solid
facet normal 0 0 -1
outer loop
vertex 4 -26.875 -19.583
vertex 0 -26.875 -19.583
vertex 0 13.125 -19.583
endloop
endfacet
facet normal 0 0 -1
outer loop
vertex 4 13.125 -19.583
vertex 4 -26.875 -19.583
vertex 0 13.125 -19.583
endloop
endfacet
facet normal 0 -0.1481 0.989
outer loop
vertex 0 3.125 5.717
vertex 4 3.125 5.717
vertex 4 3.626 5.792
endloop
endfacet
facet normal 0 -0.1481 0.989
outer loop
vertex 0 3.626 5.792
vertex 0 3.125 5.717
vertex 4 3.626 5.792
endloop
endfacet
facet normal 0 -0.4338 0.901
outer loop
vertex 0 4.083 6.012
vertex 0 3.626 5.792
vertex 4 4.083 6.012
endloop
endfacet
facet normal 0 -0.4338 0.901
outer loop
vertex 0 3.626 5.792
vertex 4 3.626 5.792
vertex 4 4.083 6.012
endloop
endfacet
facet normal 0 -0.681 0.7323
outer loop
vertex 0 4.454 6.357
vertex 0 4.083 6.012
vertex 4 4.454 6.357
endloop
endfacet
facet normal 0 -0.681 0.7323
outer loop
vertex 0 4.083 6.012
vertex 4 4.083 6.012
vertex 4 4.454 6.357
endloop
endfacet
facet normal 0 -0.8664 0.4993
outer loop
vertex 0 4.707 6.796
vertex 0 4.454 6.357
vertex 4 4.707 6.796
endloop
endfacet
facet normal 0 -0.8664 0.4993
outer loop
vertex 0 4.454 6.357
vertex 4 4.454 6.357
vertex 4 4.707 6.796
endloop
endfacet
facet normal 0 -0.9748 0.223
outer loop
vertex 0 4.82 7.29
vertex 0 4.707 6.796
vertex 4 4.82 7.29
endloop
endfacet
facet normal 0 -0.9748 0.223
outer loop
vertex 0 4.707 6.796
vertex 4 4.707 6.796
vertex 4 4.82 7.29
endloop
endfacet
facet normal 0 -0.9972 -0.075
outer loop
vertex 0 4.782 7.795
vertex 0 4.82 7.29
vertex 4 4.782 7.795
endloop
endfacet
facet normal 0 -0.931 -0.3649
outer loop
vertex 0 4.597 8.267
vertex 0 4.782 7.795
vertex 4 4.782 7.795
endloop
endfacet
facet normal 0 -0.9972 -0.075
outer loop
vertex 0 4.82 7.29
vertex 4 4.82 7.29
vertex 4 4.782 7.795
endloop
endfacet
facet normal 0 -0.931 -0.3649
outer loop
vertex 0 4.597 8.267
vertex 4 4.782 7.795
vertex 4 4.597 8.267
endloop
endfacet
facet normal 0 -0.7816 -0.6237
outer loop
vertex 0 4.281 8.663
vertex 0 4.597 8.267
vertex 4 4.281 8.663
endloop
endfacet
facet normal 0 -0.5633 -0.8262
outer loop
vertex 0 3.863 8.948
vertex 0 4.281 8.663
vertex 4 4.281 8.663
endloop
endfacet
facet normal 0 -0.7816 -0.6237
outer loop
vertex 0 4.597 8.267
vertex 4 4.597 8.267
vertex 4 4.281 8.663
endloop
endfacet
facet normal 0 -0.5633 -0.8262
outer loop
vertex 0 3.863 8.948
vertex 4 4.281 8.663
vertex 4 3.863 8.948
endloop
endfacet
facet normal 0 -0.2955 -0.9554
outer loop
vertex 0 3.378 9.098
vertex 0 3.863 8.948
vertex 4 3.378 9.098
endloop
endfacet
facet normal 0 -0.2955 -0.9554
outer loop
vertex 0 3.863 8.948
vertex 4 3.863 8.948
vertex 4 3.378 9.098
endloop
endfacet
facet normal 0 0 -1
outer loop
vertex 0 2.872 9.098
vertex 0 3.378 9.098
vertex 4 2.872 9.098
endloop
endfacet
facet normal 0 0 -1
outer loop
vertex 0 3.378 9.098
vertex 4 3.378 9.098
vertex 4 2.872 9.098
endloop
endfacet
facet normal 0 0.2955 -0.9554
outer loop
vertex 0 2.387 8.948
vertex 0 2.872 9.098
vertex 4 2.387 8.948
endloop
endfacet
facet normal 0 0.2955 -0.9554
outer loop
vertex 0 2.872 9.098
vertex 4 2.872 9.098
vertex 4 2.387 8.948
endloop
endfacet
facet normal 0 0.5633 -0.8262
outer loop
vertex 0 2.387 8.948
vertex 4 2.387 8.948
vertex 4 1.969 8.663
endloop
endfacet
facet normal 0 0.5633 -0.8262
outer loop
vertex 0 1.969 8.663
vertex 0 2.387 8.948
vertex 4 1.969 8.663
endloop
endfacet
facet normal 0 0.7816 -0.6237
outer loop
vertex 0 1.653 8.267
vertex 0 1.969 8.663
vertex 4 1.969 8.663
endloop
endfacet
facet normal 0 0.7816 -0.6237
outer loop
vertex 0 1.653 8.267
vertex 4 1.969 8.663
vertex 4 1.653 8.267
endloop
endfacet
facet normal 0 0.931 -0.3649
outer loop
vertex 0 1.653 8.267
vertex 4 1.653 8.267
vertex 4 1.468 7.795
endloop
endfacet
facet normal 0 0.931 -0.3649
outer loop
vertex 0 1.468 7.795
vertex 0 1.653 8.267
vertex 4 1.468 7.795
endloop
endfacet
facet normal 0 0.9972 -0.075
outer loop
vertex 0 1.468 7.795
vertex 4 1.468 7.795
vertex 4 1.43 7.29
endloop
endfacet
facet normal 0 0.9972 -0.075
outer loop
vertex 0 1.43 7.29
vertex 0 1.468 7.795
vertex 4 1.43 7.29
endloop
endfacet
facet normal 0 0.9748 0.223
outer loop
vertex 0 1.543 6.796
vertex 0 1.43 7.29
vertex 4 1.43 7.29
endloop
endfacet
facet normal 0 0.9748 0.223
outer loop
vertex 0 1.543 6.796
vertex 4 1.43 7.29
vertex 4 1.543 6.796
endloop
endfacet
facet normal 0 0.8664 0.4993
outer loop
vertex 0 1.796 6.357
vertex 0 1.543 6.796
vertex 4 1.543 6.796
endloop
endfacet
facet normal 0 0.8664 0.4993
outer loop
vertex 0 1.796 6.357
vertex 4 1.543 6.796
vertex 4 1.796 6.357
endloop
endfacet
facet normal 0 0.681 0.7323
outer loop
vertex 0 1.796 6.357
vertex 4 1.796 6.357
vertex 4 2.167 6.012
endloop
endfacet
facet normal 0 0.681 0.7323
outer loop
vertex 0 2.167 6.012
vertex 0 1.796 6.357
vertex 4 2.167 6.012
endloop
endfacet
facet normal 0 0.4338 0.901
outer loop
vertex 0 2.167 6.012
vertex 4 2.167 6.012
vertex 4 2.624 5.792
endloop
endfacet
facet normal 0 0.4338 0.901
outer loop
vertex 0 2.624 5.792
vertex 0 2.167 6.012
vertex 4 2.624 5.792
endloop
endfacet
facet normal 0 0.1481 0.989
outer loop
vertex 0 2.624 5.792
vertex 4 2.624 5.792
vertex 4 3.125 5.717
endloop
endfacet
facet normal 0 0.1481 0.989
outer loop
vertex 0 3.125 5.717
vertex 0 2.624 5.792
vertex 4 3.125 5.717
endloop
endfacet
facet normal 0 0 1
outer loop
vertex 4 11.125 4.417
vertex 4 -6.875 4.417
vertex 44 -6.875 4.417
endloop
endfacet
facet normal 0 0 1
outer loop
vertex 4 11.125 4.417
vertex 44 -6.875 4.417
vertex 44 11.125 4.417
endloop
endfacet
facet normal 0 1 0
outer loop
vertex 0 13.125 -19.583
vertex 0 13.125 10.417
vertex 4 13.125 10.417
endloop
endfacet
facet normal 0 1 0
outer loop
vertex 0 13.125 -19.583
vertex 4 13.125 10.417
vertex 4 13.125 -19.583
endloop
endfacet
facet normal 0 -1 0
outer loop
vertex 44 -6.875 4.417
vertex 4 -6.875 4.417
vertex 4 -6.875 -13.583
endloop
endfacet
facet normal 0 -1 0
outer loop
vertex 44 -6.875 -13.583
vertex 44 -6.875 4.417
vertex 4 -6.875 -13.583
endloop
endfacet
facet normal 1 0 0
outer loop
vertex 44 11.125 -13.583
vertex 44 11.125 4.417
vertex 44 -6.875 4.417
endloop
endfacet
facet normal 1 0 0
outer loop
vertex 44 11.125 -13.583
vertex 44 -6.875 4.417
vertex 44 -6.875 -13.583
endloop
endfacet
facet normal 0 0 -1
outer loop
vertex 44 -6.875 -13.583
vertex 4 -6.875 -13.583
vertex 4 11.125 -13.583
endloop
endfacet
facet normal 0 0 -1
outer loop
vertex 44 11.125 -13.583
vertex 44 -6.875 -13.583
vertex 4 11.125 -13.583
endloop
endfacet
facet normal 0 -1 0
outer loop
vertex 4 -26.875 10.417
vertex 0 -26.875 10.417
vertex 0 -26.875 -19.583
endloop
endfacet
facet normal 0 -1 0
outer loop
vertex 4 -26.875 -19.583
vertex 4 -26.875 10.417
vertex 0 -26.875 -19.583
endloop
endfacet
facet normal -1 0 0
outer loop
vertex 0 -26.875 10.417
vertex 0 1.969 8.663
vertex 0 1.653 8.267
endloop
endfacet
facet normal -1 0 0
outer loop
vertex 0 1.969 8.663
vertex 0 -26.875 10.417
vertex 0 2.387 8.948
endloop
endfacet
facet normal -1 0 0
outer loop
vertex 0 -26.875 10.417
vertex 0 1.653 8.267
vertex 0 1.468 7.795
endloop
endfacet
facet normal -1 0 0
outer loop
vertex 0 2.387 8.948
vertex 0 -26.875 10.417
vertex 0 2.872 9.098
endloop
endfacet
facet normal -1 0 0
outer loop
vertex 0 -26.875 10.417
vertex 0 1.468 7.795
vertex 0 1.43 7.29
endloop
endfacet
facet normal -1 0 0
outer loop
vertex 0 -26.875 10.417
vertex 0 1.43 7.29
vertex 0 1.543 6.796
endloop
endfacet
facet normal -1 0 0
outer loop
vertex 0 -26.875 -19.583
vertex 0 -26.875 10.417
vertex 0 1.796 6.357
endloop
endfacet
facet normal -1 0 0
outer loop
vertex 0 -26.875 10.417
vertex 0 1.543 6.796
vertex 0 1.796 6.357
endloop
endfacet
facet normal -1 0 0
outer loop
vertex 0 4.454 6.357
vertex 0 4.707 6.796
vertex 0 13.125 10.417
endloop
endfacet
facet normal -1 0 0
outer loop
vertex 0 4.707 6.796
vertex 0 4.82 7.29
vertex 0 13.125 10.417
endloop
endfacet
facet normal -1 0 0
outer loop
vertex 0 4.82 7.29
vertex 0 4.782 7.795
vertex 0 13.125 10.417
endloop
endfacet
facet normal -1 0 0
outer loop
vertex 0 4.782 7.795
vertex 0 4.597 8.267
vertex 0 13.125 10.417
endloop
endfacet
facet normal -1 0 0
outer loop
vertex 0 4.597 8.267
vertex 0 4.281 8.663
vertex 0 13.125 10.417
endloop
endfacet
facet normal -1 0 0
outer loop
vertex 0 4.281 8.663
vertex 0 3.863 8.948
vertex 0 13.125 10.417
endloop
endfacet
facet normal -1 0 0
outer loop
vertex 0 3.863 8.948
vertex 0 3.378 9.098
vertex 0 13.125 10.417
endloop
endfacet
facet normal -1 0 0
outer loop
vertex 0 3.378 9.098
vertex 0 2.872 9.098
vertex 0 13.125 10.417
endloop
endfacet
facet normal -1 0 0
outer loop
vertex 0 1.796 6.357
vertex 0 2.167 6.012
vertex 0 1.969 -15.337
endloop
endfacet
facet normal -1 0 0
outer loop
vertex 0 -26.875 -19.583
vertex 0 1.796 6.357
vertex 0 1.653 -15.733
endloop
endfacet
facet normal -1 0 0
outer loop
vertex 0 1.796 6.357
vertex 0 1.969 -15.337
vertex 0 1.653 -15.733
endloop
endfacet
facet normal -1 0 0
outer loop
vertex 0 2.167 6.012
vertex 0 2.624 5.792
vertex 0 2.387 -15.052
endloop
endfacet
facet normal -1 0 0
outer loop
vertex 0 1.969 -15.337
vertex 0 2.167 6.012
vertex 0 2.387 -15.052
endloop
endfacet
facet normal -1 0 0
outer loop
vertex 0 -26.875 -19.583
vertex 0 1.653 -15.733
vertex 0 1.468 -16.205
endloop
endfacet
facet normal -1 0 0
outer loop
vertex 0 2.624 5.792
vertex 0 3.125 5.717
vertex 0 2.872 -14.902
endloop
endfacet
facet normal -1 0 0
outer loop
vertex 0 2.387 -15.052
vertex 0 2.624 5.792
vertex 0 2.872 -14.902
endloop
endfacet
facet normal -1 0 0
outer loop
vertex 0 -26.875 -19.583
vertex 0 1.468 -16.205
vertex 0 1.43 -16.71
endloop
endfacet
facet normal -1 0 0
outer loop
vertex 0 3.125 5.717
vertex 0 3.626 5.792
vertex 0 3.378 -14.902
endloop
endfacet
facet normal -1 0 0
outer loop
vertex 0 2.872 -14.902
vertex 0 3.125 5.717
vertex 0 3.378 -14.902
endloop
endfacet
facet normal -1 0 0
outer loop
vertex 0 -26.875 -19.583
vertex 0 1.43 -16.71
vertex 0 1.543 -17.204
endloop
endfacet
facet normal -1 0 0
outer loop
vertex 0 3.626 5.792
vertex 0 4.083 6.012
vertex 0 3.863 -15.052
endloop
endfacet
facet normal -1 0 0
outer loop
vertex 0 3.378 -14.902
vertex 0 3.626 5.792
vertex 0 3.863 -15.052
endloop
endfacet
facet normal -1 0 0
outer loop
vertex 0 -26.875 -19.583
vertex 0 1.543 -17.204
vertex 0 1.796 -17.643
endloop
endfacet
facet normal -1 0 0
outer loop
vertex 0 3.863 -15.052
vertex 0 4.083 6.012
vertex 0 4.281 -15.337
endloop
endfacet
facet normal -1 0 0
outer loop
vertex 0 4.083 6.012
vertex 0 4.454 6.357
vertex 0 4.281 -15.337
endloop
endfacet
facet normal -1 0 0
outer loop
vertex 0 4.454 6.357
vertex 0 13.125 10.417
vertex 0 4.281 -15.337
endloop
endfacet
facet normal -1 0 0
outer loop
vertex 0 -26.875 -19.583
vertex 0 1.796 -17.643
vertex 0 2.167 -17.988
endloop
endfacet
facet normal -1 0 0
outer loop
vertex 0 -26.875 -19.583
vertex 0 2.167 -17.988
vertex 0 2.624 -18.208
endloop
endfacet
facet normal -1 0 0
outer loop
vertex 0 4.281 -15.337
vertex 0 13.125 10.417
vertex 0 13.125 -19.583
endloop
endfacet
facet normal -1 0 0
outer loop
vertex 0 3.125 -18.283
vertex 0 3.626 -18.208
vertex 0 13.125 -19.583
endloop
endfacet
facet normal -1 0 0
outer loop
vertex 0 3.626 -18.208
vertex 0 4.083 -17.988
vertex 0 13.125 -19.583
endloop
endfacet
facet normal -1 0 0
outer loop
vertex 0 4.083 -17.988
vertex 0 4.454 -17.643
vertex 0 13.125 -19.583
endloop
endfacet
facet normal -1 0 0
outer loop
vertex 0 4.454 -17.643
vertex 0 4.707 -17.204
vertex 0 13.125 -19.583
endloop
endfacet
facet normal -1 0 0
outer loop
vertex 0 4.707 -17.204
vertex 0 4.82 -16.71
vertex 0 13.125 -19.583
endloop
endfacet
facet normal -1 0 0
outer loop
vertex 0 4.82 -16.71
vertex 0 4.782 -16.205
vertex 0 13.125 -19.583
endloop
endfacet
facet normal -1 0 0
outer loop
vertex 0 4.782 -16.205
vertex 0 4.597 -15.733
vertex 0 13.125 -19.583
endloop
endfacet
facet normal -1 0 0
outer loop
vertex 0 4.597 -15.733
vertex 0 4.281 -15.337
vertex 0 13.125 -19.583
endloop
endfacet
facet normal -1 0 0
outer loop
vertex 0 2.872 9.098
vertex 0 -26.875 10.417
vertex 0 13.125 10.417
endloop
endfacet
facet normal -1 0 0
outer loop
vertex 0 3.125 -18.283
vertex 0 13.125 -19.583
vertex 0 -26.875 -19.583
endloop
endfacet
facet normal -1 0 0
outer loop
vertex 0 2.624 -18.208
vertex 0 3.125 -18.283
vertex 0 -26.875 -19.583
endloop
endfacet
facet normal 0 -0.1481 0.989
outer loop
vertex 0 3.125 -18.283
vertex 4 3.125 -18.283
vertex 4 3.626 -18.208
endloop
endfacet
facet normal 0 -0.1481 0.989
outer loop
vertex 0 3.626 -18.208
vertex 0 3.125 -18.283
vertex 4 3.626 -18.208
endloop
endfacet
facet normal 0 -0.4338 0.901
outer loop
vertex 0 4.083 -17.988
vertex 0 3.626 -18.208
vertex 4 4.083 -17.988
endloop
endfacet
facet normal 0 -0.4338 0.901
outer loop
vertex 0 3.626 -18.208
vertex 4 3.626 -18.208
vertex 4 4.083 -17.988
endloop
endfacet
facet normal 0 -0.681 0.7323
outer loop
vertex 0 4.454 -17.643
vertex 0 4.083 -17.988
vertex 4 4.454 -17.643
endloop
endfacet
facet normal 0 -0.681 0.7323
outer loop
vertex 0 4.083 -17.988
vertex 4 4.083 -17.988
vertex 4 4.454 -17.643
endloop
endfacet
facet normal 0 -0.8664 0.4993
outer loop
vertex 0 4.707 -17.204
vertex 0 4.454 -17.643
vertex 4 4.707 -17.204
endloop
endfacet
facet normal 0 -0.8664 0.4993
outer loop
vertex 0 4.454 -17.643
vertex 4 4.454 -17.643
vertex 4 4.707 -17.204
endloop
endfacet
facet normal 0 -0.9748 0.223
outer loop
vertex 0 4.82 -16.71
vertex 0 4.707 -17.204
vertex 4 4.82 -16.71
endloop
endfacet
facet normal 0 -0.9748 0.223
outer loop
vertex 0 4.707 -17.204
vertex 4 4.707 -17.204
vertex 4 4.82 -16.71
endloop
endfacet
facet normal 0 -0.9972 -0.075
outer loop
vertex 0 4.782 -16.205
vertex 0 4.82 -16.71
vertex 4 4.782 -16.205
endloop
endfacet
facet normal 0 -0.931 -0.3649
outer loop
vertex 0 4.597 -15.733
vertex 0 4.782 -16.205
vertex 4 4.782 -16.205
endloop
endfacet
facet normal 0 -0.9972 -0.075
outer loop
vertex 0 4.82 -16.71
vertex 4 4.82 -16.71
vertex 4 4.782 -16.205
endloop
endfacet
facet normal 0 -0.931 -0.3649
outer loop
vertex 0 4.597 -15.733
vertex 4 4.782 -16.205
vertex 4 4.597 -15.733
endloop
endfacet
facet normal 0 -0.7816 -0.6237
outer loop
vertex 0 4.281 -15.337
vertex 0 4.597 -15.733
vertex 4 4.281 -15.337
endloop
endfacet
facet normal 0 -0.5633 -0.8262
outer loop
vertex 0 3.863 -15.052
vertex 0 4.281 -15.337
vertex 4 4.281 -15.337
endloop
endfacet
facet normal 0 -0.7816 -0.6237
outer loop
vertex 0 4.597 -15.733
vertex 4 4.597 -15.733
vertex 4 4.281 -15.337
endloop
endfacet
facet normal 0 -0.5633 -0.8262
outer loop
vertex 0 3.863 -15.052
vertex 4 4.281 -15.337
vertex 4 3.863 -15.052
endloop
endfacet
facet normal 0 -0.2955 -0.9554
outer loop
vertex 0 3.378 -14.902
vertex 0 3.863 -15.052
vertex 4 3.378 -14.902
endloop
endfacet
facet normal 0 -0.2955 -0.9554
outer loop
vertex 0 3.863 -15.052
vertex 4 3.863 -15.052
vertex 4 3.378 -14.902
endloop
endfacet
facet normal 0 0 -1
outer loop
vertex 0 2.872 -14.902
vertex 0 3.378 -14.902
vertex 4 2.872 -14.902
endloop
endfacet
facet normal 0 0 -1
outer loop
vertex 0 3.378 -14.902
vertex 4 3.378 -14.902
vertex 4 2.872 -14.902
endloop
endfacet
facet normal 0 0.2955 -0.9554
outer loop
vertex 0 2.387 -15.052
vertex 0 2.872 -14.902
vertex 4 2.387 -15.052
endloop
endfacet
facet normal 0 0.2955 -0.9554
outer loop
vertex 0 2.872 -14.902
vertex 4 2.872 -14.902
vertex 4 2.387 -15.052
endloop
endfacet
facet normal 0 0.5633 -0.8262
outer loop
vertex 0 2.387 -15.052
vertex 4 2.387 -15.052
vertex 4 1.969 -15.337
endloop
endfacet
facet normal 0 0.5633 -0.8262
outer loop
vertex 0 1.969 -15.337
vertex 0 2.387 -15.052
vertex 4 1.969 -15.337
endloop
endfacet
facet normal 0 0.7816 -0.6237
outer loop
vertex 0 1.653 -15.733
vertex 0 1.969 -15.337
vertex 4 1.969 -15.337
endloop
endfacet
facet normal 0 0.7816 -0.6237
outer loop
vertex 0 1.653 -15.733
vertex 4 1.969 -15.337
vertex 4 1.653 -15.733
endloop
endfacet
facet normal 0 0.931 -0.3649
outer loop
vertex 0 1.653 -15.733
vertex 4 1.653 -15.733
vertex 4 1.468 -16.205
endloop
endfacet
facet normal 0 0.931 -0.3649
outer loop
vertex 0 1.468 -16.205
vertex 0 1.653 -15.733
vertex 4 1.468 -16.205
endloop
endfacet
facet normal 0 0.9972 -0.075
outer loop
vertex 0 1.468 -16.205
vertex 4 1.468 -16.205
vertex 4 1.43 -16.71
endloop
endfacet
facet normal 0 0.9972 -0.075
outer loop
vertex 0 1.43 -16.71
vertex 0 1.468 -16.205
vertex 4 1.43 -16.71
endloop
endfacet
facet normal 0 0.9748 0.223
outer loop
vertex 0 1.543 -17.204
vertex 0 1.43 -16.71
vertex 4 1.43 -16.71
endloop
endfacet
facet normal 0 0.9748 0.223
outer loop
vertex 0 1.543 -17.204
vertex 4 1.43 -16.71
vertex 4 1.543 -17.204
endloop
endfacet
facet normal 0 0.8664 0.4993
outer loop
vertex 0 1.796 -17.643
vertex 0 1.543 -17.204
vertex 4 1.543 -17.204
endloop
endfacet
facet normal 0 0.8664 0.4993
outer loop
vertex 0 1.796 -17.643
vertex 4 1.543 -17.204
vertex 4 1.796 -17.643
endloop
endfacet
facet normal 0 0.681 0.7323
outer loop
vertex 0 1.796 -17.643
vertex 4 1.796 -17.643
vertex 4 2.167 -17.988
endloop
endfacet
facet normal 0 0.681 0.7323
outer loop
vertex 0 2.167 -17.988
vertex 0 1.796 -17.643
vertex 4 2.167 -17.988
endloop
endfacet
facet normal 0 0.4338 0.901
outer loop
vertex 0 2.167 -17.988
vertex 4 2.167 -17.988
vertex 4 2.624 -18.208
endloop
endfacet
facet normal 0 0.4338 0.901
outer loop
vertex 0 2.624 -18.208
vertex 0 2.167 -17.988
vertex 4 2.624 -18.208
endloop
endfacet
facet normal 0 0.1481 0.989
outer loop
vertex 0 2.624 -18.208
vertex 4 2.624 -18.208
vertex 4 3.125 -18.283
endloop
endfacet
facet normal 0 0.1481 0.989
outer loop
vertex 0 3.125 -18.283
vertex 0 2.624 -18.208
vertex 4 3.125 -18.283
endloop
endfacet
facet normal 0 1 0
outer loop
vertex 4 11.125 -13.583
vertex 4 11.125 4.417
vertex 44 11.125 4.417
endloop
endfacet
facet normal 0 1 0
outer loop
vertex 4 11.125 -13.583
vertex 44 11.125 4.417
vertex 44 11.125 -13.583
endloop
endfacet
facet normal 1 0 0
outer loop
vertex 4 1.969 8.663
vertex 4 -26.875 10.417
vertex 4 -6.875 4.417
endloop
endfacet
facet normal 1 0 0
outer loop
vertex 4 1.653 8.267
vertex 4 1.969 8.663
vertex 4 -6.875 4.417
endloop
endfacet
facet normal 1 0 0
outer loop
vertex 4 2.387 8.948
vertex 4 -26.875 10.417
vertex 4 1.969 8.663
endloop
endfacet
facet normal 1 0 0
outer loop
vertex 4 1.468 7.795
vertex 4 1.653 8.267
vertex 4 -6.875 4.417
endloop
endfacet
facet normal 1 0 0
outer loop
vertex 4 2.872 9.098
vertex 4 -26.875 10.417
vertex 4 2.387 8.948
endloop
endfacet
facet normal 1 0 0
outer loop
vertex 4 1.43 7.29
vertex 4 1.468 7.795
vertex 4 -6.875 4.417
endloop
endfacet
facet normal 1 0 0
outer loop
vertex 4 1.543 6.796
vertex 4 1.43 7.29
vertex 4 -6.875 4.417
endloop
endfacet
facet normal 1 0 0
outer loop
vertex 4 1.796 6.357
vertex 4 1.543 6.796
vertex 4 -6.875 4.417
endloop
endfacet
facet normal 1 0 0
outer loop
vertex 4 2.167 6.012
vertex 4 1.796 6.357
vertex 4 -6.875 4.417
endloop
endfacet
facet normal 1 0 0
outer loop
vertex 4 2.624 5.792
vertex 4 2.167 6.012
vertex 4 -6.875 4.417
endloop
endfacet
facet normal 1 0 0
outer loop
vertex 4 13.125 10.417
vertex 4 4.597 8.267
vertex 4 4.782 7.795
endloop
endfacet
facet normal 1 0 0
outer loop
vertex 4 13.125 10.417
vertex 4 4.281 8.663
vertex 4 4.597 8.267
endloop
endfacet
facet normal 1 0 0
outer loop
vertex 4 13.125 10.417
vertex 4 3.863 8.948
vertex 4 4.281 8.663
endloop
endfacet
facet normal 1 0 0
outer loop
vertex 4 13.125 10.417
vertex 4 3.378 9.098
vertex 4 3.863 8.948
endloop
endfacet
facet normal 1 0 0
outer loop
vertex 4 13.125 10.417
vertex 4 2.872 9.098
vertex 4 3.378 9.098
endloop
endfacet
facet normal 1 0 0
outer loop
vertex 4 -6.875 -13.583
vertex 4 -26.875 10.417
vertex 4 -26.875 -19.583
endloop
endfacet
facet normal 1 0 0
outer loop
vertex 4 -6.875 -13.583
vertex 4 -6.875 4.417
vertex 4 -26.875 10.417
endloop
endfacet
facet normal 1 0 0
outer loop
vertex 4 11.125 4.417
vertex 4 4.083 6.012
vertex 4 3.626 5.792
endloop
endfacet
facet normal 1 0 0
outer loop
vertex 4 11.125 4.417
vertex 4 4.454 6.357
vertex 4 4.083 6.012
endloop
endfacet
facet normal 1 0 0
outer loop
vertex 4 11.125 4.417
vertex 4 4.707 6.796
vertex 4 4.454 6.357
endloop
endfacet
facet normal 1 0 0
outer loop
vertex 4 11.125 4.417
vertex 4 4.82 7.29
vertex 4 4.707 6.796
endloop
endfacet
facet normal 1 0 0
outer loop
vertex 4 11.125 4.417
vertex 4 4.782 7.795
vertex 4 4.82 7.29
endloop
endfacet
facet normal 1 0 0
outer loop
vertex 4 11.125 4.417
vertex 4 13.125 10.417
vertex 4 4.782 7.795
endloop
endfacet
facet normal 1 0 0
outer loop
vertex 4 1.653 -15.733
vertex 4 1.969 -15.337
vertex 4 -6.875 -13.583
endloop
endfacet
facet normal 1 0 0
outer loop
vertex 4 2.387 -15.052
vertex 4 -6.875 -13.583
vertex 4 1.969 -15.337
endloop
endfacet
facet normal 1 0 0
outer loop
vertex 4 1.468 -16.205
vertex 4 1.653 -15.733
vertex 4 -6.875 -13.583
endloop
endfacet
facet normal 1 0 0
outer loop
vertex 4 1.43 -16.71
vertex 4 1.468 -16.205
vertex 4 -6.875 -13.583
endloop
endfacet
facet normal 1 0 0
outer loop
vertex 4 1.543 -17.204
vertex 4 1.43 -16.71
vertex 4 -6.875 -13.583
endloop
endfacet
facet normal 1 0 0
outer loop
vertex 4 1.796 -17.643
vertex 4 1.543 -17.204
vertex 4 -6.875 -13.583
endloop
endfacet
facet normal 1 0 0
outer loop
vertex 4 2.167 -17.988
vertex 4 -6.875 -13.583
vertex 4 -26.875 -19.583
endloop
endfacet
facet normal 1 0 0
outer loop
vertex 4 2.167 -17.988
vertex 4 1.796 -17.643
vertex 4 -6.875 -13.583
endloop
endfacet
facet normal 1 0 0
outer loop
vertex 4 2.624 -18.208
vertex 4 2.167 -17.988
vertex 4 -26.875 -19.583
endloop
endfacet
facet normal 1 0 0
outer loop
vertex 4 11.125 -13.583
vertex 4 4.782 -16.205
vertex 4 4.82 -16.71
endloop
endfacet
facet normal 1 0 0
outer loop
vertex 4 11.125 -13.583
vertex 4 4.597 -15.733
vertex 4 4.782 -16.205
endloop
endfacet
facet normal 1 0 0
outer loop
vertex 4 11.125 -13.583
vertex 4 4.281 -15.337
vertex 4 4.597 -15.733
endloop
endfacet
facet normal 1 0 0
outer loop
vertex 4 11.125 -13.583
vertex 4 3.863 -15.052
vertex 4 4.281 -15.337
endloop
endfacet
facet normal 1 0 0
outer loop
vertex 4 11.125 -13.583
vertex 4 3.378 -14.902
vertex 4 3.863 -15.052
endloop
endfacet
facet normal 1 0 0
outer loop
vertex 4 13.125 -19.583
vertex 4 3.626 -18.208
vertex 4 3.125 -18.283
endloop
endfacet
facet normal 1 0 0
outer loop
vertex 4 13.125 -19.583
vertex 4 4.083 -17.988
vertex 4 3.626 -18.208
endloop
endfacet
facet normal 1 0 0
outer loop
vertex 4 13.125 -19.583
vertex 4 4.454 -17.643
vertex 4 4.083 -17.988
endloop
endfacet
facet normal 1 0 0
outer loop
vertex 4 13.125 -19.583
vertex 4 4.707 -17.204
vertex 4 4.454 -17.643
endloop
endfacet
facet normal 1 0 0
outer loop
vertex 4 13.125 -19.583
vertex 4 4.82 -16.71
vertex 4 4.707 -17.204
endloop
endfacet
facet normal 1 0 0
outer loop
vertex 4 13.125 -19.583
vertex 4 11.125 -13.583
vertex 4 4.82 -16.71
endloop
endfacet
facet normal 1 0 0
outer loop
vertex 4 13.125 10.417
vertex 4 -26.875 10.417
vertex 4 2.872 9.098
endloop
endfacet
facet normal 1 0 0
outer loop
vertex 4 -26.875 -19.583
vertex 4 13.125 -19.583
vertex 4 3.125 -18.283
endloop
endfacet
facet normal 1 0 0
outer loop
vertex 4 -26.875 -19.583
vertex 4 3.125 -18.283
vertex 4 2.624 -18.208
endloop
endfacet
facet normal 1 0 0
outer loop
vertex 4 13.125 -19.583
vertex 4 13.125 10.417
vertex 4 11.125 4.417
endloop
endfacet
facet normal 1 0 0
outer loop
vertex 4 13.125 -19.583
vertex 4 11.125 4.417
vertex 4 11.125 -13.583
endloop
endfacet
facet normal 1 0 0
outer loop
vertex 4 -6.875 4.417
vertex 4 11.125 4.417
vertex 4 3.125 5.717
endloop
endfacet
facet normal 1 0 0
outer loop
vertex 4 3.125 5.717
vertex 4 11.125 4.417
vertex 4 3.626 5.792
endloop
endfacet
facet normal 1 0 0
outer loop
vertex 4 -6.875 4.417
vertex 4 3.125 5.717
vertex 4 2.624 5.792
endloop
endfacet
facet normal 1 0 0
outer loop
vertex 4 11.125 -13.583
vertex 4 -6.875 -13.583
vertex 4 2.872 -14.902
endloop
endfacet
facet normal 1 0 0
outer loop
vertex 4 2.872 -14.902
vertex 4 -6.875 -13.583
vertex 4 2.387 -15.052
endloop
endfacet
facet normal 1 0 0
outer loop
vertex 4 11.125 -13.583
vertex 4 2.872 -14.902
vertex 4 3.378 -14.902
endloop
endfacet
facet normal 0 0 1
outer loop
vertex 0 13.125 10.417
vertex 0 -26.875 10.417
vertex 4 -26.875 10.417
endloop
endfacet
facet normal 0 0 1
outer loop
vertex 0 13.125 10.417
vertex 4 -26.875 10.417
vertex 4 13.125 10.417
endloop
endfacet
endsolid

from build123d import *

# Parameters (mm, degrees)
SKETCH1_W           = 30
SKETCH1_H           = 40
BOSS_EXTRUDE1_DEPTH = 4
SKETCH2_W           = 18
SKETCH2_H           = 18
BOSS_EXTRUDE2_DEPTH = 40
SKETCH3_R           = 1.7
CUT_EXTRUDE1_DEPTH  = 53.017041145


with BuildPart() as part:
    # Sketch1 → Boss-Extrude1 (new body)
    with BuildSketch(Plane(origin=(0, 0, 0), x_dir=(0, 0, -1), z_dir=(1, 0, 0))):
        with Locations((4.583333333, -6.875)):
            Rectangle(SKETCH1_W, SKETCH1_H)
    extrude(amount=BOSS_EXTRUDE1_DEPTH)

    # Sketch2 → Boss-Extrude2 (add)
    with BuildSketch(Plane(origin=(4, 0, 0), x_dir=(0, 0, -1), z_dir=(1, 0, 0))):
        with Locations((4.583333333, 2.125)):
            Rectangle(SKETCH2_W, SKETCH2_H)
    extrude(amount=BOSS_EXTRUDE2_DEPTH)

    # Sketch3 → Cut-Extrude1 (cut, through all)
    with BuildSketch(Plane(origin=(4, 0, 0), x_dir=(0, 0, -1), z_dir=(1, 0, 0))):
        with Locations((-7.416666667, 3.125)):
            Circle(SKETCH3_R)
        with Locations((16.583333333, 3.125)):
            Circle(SKETCH3_R)
    extrude(amount=-CUT_EXTRUDE1_DEPTH, mode=Mode.SUBTRACT)


solid = part.part
